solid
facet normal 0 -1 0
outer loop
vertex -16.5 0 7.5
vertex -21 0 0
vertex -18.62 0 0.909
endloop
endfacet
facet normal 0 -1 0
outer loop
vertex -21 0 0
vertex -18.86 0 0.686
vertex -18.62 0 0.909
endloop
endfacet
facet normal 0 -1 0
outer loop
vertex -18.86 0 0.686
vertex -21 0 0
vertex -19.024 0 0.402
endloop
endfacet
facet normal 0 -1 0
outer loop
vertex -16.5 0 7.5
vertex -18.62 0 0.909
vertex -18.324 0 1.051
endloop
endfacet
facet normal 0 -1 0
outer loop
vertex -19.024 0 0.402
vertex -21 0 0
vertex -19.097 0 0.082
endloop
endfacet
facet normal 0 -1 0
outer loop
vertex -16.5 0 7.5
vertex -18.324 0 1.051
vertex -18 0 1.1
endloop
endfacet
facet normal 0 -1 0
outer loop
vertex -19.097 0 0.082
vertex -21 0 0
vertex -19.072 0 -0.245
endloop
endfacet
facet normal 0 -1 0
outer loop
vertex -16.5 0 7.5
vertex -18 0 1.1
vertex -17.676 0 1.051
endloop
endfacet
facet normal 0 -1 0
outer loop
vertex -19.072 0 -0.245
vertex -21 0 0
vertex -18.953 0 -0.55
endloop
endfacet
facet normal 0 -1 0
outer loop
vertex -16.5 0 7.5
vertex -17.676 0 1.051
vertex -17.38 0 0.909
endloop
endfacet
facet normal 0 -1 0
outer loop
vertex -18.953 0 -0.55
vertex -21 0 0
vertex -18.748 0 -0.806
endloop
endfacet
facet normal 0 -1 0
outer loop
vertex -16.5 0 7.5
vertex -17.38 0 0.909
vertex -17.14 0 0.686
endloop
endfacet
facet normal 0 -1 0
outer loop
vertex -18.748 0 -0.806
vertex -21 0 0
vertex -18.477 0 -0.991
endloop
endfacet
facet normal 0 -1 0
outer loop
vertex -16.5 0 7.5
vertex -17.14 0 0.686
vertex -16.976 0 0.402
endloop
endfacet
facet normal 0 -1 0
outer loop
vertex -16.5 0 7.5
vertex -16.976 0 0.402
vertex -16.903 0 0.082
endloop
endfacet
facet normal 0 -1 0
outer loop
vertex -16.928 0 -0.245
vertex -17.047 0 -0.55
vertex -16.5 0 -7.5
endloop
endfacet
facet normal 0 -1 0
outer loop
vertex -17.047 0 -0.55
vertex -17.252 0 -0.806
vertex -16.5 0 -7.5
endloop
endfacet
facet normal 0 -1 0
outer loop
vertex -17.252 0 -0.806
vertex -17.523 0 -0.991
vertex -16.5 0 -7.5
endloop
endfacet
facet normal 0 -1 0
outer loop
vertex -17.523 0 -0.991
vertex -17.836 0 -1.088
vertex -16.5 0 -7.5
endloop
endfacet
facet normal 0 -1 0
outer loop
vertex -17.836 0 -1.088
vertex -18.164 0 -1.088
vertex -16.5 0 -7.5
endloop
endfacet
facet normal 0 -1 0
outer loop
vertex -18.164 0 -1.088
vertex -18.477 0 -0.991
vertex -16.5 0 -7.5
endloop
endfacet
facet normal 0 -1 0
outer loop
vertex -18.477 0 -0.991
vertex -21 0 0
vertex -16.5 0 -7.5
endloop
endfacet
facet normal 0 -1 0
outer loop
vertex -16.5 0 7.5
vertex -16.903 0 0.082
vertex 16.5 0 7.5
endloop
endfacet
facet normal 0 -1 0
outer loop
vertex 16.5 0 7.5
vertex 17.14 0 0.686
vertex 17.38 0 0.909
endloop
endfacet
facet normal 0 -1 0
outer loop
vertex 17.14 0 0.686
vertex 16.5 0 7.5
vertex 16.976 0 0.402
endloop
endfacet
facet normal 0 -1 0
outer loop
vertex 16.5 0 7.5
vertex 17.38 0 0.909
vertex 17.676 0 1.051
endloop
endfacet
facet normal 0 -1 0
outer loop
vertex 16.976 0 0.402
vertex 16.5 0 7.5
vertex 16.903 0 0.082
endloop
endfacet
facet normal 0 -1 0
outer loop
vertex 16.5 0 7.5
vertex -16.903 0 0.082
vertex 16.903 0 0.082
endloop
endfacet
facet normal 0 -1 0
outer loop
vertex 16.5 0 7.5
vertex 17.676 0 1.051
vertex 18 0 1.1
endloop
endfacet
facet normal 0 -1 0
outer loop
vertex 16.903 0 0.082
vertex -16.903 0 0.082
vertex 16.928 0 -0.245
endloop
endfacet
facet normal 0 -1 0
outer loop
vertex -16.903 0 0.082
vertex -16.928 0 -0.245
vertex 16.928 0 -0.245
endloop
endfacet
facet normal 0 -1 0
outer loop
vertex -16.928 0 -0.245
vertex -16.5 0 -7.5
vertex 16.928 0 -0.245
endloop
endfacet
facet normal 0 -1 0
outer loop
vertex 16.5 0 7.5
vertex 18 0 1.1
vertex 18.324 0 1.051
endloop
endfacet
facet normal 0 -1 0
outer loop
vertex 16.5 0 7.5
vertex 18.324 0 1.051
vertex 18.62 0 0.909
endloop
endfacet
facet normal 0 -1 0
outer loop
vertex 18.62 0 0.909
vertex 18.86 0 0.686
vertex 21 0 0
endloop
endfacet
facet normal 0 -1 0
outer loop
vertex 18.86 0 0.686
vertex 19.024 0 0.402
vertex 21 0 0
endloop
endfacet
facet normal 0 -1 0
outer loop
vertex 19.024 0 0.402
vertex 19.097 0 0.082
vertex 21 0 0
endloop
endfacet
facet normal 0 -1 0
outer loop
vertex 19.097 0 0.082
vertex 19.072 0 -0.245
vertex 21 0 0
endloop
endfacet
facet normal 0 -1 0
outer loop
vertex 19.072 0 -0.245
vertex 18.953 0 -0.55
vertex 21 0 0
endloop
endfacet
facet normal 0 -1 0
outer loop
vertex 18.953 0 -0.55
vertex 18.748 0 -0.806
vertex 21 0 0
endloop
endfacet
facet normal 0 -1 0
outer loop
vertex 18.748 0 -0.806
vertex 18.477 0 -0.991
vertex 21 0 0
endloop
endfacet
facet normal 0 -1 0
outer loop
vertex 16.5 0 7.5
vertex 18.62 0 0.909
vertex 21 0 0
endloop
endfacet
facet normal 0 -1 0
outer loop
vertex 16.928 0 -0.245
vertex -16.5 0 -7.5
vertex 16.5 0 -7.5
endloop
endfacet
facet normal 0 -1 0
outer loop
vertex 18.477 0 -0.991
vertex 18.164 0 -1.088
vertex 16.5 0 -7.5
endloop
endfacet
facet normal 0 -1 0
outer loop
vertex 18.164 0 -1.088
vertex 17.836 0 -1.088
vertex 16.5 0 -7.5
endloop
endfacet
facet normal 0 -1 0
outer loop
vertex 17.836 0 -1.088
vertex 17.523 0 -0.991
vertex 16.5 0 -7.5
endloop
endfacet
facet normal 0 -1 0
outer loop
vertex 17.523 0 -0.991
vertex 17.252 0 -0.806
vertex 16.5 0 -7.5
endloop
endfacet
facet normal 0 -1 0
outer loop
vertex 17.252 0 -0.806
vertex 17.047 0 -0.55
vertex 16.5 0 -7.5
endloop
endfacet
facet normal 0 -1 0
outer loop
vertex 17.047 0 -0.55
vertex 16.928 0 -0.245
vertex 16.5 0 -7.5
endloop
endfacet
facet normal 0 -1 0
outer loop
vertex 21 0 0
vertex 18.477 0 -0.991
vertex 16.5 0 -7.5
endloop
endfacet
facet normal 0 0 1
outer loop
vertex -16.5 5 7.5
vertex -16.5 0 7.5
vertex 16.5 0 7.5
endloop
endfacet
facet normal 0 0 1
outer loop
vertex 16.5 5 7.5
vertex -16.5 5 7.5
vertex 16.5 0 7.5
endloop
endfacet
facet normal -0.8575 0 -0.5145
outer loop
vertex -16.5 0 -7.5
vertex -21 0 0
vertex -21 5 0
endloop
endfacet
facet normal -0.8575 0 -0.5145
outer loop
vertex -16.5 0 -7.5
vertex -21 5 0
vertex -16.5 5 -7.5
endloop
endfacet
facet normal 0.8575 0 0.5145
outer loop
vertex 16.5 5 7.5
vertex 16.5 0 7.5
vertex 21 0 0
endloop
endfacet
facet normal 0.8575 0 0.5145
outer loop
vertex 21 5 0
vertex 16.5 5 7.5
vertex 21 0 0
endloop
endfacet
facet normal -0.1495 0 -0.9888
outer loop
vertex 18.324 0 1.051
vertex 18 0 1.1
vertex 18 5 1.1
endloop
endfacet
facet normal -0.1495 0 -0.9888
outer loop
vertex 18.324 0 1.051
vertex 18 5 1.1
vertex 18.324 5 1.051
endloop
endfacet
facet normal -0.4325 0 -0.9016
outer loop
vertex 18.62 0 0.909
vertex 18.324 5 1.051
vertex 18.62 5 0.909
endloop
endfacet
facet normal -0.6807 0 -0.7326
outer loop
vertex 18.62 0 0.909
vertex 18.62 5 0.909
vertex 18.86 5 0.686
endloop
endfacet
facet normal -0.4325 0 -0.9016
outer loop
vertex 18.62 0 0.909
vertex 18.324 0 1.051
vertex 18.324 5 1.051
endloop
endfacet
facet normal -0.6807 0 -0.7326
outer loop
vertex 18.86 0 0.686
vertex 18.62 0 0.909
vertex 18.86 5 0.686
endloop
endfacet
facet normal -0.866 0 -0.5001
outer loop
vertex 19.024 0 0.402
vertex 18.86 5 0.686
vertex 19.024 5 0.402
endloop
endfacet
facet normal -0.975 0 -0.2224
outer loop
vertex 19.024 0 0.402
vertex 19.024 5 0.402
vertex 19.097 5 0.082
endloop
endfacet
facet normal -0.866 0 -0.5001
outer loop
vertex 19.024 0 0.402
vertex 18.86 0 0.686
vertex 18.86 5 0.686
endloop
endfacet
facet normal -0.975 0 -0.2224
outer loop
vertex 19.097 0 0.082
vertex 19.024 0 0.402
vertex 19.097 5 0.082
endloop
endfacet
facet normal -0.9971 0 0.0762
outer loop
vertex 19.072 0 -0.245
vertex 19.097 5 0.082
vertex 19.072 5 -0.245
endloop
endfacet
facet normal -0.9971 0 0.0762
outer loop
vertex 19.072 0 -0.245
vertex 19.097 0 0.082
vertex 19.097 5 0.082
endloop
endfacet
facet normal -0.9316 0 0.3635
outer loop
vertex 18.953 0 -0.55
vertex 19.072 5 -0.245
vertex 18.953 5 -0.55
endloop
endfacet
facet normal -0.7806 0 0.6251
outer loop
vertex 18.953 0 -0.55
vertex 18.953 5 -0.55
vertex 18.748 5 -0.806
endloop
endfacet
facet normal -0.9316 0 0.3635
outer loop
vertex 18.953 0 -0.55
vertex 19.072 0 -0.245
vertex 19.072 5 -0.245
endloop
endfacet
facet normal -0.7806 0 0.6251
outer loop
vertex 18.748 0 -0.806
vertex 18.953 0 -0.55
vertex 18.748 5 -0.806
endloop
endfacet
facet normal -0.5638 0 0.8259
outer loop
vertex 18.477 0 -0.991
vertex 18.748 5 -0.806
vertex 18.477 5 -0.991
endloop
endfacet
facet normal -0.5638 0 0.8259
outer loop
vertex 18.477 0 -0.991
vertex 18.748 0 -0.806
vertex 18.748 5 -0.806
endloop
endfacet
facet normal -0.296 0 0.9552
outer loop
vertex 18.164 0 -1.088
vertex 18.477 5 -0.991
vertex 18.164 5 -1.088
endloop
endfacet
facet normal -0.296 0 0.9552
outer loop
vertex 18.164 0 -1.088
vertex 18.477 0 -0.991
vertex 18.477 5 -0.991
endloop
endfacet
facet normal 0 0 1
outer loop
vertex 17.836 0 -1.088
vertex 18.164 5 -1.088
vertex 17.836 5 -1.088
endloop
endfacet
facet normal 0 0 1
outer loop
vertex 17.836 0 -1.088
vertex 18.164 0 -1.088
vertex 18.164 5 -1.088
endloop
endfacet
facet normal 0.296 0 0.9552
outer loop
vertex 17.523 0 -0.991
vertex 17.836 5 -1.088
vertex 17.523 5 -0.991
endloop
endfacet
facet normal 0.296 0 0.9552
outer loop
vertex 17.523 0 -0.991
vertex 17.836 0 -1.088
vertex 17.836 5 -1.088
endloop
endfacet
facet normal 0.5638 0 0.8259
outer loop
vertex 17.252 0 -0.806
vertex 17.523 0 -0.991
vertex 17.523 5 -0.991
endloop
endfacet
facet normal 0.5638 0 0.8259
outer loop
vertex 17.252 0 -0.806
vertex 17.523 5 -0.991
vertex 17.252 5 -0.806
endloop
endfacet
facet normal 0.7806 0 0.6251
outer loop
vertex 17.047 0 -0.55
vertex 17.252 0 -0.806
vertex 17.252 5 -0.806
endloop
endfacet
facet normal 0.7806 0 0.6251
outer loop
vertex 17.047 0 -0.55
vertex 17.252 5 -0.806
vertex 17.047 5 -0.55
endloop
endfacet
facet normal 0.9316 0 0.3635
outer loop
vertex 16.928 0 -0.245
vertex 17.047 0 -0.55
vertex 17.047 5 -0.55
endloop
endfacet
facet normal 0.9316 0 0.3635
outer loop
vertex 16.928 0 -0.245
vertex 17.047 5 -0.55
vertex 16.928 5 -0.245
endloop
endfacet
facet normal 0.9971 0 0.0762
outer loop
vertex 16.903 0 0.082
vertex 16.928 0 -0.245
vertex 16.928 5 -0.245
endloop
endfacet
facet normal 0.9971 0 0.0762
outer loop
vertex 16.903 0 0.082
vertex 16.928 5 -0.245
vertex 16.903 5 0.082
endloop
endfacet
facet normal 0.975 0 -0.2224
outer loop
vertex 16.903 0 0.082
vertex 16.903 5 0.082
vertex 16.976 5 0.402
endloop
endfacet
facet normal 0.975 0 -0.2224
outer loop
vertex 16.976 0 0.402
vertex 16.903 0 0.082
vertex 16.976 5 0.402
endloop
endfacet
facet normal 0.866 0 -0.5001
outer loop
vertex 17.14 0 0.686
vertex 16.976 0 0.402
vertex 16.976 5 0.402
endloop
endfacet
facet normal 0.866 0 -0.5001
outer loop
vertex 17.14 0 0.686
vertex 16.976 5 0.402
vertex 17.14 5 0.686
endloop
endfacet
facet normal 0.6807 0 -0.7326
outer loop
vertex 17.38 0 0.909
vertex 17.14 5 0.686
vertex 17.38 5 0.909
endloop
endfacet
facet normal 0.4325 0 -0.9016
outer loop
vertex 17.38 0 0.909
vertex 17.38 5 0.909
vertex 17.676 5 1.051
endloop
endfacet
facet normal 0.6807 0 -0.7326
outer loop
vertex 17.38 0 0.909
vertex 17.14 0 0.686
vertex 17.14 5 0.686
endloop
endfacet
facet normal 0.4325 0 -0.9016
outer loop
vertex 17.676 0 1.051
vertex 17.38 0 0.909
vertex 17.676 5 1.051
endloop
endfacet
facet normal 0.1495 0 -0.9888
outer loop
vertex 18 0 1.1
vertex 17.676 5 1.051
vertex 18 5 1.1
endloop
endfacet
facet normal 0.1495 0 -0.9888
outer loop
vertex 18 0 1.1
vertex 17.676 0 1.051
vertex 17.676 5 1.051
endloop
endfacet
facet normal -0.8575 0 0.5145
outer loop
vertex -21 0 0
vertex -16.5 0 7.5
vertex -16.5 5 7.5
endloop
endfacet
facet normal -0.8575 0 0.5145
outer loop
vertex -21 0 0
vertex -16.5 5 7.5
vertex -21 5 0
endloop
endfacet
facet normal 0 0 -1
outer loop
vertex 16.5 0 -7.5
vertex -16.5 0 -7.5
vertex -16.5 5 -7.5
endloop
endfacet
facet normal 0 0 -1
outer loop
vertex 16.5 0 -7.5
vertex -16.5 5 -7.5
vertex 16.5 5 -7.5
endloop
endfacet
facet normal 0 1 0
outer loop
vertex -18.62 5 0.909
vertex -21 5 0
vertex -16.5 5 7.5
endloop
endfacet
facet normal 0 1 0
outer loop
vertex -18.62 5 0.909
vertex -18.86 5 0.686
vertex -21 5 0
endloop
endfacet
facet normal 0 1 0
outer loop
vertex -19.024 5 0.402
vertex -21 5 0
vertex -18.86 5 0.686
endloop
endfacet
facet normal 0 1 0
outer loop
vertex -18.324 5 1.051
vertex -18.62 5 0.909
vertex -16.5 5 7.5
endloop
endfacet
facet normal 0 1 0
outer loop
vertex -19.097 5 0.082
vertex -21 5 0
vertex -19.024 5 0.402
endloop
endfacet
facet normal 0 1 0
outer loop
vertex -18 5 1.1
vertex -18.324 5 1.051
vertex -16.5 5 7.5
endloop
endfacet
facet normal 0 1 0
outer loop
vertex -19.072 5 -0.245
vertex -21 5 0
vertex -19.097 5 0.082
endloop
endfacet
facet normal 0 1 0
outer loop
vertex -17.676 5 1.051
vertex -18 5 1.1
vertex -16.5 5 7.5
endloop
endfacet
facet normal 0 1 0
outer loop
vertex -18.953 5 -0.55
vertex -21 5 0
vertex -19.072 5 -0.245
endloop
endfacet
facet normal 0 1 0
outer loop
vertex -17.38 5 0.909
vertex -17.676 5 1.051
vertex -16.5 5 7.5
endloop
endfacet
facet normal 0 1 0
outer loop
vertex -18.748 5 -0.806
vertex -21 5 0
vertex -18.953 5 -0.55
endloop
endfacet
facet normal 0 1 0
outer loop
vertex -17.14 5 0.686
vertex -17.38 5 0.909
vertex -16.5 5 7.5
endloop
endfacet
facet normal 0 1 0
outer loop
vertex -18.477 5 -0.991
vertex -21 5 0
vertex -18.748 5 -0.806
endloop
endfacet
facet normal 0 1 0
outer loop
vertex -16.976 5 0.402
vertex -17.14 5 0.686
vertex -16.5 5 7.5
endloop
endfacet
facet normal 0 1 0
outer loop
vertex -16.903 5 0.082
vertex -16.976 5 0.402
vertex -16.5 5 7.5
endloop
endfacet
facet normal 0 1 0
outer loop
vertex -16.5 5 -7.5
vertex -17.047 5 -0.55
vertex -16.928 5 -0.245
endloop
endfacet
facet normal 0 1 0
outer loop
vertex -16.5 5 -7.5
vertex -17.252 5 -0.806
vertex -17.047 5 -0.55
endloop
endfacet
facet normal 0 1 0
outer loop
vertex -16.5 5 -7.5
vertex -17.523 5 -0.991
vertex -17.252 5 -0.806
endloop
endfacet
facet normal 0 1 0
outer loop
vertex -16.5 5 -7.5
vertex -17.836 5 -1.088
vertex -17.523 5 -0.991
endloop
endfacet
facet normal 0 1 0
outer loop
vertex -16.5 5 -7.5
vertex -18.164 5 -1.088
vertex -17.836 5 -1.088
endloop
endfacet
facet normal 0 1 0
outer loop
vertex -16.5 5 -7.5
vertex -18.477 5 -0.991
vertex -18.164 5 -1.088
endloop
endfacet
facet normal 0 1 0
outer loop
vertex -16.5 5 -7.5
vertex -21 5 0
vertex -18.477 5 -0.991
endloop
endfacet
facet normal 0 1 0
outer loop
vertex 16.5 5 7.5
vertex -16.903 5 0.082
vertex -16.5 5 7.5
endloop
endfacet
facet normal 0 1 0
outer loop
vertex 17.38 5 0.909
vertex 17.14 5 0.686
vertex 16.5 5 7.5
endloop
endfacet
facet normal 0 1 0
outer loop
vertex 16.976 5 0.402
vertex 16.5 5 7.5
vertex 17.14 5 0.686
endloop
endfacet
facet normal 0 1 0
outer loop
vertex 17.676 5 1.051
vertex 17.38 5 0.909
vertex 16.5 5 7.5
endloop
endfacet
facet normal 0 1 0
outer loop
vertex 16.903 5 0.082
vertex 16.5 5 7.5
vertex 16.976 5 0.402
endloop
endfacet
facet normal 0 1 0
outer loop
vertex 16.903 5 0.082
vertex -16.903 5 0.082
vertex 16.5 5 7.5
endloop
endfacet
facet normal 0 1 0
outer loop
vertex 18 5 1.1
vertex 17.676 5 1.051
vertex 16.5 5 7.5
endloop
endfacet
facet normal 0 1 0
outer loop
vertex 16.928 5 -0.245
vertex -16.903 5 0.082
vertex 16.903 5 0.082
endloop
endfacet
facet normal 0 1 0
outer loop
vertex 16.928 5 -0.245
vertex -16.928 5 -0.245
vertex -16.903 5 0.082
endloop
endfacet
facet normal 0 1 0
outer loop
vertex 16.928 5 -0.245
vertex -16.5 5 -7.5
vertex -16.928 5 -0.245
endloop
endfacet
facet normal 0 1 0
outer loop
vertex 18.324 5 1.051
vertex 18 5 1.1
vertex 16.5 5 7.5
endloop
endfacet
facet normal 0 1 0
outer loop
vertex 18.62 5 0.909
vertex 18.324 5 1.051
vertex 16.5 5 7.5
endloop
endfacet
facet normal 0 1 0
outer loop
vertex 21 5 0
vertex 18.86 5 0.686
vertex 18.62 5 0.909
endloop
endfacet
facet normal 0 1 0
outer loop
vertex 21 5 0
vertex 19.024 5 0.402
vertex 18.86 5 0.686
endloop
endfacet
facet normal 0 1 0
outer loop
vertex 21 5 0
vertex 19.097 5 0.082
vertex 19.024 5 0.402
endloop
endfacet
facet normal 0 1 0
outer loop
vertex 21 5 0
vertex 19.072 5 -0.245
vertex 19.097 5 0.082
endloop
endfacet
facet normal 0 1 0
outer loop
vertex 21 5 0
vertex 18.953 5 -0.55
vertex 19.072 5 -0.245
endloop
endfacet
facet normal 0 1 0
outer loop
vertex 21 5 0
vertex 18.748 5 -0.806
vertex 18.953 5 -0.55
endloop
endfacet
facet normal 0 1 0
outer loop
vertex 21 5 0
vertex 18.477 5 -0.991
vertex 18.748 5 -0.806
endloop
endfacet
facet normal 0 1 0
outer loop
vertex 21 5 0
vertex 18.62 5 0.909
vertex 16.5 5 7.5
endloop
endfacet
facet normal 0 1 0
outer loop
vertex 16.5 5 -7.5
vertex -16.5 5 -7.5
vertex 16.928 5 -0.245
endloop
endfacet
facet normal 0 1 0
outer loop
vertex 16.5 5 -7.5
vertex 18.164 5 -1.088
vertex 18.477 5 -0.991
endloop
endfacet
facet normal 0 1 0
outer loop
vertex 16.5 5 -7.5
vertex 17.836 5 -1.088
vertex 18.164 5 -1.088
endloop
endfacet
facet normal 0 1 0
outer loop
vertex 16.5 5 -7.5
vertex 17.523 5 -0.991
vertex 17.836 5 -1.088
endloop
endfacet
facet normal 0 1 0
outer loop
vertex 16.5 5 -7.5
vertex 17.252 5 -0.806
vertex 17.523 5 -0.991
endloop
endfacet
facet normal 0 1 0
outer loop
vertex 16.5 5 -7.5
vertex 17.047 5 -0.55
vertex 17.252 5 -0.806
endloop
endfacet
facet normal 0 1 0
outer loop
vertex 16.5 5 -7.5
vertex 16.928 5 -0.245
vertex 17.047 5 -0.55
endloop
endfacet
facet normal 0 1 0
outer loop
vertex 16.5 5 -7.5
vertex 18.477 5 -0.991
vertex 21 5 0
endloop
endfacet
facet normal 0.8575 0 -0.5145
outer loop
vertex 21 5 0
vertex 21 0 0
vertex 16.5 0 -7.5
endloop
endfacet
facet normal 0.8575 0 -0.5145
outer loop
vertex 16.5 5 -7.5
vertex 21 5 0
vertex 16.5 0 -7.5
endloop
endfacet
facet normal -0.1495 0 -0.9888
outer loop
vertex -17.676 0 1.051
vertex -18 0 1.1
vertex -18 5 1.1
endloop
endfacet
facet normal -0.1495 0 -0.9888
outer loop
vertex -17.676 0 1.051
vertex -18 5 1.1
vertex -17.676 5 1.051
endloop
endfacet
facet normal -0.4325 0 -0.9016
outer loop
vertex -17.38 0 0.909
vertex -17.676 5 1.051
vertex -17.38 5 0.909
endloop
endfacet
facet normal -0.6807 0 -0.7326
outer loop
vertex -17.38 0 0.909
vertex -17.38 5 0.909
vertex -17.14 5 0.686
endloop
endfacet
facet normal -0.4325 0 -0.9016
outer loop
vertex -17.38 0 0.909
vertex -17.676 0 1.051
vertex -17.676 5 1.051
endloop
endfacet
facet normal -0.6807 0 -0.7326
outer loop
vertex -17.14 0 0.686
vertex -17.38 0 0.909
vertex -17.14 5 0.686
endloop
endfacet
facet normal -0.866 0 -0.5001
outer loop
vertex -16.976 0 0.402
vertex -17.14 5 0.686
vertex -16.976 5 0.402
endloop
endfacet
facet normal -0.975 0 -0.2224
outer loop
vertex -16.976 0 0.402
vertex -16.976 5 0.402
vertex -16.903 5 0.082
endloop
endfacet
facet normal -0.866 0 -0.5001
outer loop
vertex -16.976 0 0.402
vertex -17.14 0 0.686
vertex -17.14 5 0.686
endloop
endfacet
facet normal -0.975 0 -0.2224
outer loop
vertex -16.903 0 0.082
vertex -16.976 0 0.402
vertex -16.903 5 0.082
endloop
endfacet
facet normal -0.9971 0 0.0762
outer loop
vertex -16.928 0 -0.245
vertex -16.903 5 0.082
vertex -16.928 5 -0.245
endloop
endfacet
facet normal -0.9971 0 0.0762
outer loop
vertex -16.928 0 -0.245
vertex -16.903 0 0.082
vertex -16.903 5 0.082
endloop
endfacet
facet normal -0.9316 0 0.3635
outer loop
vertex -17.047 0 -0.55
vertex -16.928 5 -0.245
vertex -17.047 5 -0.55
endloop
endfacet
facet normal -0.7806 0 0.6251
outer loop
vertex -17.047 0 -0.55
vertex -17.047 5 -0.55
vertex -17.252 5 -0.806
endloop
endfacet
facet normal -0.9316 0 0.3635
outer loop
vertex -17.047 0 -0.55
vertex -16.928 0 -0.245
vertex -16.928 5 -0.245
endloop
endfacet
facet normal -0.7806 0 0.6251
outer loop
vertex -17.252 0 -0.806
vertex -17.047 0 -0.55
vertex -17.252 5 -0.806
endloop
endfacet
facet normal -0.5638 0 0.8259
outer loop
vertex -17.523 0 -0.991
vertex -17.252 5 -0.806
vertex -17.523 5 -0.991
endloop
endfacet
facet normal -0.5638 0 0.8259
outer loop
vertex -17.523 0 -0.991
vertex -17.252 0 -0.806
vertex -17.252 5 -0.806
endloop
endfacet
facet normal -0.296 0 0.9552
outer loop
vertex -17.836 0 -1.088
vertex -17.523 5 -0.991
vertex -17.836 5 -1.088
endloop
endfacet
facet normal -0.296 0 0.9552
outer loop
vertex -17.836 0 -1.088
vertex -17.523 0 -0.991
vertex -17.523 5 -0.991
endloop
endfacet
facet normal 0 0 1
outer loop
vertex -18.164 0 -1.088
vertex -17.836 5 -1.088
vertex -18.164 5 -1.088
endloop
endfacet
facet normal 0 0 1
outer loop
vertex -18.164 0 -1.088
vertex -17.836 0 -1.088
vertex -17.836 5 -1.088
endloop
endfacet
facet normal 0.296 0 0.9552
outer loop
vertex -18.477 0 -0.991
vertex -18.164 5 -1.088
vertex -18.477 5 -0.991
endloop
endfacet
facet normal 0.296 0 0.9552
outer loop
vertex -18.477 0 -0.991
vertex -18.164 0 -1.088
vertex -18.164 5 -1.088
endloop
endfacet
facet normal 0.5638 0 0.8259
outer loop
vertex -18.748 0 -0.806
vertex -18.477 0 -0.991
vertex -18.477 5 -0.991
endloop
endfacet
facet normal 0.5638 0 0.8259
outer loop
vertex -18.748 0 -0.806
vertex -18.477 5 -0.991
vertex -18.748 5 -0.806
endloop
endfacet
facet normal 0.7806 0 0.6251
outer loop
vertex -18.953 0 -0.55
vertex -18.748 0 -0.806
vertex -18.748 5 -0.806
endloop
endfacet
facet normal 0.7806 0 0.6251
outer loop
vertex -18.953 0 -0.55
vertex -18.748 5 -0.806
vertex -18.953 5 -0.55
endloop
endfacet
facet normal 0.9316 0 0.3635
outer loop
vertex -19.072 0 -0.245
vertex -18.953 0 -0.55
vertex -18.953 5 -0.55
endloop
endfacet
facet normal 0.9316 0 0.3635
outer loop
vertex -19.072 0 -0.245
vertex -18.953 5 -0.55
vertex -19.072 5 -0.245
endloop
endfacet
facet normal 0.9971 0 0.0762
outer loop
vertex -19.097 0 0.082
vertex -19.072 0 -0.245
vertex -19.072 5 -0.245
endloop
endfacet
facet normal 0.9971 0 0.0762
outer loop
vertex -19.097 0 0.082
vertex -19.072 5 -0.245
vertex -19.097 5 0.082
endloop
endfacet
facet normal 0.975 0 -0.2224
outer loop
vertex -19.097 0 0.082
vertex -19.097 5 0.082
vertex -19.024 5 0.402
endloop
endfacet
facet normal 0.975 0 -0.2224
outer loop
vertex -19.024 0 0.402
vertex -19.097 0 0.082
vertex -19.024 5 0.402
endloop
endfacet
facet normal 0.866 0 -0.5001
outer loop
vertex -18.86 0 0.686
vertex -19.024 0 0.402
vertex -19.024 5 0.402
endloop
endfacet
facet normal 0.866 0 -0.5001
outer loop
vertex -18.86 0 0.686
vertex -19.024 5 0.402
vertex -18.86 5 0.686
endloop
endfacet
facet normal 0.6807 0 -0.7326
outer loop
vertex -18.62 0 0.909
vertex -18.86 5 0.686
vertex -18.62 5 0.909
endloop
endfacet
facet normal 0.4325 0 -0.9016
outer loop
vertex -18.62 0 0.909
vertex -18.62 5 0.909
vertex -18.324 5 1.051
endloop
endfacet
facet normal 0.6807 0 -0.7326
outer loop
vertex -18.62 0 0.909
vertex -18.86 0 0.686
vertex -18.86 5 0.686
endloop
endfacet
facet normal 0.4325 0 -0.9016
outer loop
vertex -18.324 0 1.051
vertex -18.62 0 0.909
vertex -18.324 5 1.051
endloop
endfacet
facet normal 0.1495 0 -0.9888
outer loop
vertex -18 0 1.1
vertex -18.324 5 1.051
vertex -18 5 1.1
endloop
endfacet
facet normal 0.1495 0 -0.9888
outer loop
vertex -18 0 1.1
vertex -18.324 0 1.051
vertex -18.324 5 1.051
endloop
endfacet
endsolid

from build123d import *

# Parameters (mm, degrees)
SKETCH_1_W      = 33
SKETCH_1_H      = 15
SKETCH_1_R      = 1.1
EXTRUDE_1_DEPTH = 5


with BuildPart() as part:
    # 草图1 → 凸台-拉伸1 (new body)
    # profile 1 of 3: a face of its own
    with BuildSketch(Plane(origin=(0, 0, 0), x_dir=(1, 0, 0), z_dir=(0, 1, 0))):
        Rectangle(SKETCH_1_W, SKETCH_1_H)
    # profile 2 of 3: a face of its own
    with BuildSketch(Plane(origin=(0, 0, 0), x_dir=(1, 0, 0), z_dir=(0, 1, 0))):
        Polygon((-21, 0), (-16.5, 7.5), (-16.5, -7.5), align=None)
        with Locations(Location((-18, 0, 0), (0, 0, 270))):
            Circle(SKETCH_1_R, mode=Mode.SUBTRACT)
    # profile 3 of 3: a face of its own
    with BuildSketch(Plane(origin=(0, 0, 0), x_dir=(1, 0, 0), z_dir=(0, 1, 0))):
        Polygon((16.5, 7.5), (16.5, -7.5), (21, 0), align=None)
        with Locations(Location((18, 0, 0), (0, 0, 270))):
            Circle(SKETCH_1_R, mode=Mode.SUBTRACT)
    extrude(amount=EXTRUDE_1_DEPTH)


solid = part.part
